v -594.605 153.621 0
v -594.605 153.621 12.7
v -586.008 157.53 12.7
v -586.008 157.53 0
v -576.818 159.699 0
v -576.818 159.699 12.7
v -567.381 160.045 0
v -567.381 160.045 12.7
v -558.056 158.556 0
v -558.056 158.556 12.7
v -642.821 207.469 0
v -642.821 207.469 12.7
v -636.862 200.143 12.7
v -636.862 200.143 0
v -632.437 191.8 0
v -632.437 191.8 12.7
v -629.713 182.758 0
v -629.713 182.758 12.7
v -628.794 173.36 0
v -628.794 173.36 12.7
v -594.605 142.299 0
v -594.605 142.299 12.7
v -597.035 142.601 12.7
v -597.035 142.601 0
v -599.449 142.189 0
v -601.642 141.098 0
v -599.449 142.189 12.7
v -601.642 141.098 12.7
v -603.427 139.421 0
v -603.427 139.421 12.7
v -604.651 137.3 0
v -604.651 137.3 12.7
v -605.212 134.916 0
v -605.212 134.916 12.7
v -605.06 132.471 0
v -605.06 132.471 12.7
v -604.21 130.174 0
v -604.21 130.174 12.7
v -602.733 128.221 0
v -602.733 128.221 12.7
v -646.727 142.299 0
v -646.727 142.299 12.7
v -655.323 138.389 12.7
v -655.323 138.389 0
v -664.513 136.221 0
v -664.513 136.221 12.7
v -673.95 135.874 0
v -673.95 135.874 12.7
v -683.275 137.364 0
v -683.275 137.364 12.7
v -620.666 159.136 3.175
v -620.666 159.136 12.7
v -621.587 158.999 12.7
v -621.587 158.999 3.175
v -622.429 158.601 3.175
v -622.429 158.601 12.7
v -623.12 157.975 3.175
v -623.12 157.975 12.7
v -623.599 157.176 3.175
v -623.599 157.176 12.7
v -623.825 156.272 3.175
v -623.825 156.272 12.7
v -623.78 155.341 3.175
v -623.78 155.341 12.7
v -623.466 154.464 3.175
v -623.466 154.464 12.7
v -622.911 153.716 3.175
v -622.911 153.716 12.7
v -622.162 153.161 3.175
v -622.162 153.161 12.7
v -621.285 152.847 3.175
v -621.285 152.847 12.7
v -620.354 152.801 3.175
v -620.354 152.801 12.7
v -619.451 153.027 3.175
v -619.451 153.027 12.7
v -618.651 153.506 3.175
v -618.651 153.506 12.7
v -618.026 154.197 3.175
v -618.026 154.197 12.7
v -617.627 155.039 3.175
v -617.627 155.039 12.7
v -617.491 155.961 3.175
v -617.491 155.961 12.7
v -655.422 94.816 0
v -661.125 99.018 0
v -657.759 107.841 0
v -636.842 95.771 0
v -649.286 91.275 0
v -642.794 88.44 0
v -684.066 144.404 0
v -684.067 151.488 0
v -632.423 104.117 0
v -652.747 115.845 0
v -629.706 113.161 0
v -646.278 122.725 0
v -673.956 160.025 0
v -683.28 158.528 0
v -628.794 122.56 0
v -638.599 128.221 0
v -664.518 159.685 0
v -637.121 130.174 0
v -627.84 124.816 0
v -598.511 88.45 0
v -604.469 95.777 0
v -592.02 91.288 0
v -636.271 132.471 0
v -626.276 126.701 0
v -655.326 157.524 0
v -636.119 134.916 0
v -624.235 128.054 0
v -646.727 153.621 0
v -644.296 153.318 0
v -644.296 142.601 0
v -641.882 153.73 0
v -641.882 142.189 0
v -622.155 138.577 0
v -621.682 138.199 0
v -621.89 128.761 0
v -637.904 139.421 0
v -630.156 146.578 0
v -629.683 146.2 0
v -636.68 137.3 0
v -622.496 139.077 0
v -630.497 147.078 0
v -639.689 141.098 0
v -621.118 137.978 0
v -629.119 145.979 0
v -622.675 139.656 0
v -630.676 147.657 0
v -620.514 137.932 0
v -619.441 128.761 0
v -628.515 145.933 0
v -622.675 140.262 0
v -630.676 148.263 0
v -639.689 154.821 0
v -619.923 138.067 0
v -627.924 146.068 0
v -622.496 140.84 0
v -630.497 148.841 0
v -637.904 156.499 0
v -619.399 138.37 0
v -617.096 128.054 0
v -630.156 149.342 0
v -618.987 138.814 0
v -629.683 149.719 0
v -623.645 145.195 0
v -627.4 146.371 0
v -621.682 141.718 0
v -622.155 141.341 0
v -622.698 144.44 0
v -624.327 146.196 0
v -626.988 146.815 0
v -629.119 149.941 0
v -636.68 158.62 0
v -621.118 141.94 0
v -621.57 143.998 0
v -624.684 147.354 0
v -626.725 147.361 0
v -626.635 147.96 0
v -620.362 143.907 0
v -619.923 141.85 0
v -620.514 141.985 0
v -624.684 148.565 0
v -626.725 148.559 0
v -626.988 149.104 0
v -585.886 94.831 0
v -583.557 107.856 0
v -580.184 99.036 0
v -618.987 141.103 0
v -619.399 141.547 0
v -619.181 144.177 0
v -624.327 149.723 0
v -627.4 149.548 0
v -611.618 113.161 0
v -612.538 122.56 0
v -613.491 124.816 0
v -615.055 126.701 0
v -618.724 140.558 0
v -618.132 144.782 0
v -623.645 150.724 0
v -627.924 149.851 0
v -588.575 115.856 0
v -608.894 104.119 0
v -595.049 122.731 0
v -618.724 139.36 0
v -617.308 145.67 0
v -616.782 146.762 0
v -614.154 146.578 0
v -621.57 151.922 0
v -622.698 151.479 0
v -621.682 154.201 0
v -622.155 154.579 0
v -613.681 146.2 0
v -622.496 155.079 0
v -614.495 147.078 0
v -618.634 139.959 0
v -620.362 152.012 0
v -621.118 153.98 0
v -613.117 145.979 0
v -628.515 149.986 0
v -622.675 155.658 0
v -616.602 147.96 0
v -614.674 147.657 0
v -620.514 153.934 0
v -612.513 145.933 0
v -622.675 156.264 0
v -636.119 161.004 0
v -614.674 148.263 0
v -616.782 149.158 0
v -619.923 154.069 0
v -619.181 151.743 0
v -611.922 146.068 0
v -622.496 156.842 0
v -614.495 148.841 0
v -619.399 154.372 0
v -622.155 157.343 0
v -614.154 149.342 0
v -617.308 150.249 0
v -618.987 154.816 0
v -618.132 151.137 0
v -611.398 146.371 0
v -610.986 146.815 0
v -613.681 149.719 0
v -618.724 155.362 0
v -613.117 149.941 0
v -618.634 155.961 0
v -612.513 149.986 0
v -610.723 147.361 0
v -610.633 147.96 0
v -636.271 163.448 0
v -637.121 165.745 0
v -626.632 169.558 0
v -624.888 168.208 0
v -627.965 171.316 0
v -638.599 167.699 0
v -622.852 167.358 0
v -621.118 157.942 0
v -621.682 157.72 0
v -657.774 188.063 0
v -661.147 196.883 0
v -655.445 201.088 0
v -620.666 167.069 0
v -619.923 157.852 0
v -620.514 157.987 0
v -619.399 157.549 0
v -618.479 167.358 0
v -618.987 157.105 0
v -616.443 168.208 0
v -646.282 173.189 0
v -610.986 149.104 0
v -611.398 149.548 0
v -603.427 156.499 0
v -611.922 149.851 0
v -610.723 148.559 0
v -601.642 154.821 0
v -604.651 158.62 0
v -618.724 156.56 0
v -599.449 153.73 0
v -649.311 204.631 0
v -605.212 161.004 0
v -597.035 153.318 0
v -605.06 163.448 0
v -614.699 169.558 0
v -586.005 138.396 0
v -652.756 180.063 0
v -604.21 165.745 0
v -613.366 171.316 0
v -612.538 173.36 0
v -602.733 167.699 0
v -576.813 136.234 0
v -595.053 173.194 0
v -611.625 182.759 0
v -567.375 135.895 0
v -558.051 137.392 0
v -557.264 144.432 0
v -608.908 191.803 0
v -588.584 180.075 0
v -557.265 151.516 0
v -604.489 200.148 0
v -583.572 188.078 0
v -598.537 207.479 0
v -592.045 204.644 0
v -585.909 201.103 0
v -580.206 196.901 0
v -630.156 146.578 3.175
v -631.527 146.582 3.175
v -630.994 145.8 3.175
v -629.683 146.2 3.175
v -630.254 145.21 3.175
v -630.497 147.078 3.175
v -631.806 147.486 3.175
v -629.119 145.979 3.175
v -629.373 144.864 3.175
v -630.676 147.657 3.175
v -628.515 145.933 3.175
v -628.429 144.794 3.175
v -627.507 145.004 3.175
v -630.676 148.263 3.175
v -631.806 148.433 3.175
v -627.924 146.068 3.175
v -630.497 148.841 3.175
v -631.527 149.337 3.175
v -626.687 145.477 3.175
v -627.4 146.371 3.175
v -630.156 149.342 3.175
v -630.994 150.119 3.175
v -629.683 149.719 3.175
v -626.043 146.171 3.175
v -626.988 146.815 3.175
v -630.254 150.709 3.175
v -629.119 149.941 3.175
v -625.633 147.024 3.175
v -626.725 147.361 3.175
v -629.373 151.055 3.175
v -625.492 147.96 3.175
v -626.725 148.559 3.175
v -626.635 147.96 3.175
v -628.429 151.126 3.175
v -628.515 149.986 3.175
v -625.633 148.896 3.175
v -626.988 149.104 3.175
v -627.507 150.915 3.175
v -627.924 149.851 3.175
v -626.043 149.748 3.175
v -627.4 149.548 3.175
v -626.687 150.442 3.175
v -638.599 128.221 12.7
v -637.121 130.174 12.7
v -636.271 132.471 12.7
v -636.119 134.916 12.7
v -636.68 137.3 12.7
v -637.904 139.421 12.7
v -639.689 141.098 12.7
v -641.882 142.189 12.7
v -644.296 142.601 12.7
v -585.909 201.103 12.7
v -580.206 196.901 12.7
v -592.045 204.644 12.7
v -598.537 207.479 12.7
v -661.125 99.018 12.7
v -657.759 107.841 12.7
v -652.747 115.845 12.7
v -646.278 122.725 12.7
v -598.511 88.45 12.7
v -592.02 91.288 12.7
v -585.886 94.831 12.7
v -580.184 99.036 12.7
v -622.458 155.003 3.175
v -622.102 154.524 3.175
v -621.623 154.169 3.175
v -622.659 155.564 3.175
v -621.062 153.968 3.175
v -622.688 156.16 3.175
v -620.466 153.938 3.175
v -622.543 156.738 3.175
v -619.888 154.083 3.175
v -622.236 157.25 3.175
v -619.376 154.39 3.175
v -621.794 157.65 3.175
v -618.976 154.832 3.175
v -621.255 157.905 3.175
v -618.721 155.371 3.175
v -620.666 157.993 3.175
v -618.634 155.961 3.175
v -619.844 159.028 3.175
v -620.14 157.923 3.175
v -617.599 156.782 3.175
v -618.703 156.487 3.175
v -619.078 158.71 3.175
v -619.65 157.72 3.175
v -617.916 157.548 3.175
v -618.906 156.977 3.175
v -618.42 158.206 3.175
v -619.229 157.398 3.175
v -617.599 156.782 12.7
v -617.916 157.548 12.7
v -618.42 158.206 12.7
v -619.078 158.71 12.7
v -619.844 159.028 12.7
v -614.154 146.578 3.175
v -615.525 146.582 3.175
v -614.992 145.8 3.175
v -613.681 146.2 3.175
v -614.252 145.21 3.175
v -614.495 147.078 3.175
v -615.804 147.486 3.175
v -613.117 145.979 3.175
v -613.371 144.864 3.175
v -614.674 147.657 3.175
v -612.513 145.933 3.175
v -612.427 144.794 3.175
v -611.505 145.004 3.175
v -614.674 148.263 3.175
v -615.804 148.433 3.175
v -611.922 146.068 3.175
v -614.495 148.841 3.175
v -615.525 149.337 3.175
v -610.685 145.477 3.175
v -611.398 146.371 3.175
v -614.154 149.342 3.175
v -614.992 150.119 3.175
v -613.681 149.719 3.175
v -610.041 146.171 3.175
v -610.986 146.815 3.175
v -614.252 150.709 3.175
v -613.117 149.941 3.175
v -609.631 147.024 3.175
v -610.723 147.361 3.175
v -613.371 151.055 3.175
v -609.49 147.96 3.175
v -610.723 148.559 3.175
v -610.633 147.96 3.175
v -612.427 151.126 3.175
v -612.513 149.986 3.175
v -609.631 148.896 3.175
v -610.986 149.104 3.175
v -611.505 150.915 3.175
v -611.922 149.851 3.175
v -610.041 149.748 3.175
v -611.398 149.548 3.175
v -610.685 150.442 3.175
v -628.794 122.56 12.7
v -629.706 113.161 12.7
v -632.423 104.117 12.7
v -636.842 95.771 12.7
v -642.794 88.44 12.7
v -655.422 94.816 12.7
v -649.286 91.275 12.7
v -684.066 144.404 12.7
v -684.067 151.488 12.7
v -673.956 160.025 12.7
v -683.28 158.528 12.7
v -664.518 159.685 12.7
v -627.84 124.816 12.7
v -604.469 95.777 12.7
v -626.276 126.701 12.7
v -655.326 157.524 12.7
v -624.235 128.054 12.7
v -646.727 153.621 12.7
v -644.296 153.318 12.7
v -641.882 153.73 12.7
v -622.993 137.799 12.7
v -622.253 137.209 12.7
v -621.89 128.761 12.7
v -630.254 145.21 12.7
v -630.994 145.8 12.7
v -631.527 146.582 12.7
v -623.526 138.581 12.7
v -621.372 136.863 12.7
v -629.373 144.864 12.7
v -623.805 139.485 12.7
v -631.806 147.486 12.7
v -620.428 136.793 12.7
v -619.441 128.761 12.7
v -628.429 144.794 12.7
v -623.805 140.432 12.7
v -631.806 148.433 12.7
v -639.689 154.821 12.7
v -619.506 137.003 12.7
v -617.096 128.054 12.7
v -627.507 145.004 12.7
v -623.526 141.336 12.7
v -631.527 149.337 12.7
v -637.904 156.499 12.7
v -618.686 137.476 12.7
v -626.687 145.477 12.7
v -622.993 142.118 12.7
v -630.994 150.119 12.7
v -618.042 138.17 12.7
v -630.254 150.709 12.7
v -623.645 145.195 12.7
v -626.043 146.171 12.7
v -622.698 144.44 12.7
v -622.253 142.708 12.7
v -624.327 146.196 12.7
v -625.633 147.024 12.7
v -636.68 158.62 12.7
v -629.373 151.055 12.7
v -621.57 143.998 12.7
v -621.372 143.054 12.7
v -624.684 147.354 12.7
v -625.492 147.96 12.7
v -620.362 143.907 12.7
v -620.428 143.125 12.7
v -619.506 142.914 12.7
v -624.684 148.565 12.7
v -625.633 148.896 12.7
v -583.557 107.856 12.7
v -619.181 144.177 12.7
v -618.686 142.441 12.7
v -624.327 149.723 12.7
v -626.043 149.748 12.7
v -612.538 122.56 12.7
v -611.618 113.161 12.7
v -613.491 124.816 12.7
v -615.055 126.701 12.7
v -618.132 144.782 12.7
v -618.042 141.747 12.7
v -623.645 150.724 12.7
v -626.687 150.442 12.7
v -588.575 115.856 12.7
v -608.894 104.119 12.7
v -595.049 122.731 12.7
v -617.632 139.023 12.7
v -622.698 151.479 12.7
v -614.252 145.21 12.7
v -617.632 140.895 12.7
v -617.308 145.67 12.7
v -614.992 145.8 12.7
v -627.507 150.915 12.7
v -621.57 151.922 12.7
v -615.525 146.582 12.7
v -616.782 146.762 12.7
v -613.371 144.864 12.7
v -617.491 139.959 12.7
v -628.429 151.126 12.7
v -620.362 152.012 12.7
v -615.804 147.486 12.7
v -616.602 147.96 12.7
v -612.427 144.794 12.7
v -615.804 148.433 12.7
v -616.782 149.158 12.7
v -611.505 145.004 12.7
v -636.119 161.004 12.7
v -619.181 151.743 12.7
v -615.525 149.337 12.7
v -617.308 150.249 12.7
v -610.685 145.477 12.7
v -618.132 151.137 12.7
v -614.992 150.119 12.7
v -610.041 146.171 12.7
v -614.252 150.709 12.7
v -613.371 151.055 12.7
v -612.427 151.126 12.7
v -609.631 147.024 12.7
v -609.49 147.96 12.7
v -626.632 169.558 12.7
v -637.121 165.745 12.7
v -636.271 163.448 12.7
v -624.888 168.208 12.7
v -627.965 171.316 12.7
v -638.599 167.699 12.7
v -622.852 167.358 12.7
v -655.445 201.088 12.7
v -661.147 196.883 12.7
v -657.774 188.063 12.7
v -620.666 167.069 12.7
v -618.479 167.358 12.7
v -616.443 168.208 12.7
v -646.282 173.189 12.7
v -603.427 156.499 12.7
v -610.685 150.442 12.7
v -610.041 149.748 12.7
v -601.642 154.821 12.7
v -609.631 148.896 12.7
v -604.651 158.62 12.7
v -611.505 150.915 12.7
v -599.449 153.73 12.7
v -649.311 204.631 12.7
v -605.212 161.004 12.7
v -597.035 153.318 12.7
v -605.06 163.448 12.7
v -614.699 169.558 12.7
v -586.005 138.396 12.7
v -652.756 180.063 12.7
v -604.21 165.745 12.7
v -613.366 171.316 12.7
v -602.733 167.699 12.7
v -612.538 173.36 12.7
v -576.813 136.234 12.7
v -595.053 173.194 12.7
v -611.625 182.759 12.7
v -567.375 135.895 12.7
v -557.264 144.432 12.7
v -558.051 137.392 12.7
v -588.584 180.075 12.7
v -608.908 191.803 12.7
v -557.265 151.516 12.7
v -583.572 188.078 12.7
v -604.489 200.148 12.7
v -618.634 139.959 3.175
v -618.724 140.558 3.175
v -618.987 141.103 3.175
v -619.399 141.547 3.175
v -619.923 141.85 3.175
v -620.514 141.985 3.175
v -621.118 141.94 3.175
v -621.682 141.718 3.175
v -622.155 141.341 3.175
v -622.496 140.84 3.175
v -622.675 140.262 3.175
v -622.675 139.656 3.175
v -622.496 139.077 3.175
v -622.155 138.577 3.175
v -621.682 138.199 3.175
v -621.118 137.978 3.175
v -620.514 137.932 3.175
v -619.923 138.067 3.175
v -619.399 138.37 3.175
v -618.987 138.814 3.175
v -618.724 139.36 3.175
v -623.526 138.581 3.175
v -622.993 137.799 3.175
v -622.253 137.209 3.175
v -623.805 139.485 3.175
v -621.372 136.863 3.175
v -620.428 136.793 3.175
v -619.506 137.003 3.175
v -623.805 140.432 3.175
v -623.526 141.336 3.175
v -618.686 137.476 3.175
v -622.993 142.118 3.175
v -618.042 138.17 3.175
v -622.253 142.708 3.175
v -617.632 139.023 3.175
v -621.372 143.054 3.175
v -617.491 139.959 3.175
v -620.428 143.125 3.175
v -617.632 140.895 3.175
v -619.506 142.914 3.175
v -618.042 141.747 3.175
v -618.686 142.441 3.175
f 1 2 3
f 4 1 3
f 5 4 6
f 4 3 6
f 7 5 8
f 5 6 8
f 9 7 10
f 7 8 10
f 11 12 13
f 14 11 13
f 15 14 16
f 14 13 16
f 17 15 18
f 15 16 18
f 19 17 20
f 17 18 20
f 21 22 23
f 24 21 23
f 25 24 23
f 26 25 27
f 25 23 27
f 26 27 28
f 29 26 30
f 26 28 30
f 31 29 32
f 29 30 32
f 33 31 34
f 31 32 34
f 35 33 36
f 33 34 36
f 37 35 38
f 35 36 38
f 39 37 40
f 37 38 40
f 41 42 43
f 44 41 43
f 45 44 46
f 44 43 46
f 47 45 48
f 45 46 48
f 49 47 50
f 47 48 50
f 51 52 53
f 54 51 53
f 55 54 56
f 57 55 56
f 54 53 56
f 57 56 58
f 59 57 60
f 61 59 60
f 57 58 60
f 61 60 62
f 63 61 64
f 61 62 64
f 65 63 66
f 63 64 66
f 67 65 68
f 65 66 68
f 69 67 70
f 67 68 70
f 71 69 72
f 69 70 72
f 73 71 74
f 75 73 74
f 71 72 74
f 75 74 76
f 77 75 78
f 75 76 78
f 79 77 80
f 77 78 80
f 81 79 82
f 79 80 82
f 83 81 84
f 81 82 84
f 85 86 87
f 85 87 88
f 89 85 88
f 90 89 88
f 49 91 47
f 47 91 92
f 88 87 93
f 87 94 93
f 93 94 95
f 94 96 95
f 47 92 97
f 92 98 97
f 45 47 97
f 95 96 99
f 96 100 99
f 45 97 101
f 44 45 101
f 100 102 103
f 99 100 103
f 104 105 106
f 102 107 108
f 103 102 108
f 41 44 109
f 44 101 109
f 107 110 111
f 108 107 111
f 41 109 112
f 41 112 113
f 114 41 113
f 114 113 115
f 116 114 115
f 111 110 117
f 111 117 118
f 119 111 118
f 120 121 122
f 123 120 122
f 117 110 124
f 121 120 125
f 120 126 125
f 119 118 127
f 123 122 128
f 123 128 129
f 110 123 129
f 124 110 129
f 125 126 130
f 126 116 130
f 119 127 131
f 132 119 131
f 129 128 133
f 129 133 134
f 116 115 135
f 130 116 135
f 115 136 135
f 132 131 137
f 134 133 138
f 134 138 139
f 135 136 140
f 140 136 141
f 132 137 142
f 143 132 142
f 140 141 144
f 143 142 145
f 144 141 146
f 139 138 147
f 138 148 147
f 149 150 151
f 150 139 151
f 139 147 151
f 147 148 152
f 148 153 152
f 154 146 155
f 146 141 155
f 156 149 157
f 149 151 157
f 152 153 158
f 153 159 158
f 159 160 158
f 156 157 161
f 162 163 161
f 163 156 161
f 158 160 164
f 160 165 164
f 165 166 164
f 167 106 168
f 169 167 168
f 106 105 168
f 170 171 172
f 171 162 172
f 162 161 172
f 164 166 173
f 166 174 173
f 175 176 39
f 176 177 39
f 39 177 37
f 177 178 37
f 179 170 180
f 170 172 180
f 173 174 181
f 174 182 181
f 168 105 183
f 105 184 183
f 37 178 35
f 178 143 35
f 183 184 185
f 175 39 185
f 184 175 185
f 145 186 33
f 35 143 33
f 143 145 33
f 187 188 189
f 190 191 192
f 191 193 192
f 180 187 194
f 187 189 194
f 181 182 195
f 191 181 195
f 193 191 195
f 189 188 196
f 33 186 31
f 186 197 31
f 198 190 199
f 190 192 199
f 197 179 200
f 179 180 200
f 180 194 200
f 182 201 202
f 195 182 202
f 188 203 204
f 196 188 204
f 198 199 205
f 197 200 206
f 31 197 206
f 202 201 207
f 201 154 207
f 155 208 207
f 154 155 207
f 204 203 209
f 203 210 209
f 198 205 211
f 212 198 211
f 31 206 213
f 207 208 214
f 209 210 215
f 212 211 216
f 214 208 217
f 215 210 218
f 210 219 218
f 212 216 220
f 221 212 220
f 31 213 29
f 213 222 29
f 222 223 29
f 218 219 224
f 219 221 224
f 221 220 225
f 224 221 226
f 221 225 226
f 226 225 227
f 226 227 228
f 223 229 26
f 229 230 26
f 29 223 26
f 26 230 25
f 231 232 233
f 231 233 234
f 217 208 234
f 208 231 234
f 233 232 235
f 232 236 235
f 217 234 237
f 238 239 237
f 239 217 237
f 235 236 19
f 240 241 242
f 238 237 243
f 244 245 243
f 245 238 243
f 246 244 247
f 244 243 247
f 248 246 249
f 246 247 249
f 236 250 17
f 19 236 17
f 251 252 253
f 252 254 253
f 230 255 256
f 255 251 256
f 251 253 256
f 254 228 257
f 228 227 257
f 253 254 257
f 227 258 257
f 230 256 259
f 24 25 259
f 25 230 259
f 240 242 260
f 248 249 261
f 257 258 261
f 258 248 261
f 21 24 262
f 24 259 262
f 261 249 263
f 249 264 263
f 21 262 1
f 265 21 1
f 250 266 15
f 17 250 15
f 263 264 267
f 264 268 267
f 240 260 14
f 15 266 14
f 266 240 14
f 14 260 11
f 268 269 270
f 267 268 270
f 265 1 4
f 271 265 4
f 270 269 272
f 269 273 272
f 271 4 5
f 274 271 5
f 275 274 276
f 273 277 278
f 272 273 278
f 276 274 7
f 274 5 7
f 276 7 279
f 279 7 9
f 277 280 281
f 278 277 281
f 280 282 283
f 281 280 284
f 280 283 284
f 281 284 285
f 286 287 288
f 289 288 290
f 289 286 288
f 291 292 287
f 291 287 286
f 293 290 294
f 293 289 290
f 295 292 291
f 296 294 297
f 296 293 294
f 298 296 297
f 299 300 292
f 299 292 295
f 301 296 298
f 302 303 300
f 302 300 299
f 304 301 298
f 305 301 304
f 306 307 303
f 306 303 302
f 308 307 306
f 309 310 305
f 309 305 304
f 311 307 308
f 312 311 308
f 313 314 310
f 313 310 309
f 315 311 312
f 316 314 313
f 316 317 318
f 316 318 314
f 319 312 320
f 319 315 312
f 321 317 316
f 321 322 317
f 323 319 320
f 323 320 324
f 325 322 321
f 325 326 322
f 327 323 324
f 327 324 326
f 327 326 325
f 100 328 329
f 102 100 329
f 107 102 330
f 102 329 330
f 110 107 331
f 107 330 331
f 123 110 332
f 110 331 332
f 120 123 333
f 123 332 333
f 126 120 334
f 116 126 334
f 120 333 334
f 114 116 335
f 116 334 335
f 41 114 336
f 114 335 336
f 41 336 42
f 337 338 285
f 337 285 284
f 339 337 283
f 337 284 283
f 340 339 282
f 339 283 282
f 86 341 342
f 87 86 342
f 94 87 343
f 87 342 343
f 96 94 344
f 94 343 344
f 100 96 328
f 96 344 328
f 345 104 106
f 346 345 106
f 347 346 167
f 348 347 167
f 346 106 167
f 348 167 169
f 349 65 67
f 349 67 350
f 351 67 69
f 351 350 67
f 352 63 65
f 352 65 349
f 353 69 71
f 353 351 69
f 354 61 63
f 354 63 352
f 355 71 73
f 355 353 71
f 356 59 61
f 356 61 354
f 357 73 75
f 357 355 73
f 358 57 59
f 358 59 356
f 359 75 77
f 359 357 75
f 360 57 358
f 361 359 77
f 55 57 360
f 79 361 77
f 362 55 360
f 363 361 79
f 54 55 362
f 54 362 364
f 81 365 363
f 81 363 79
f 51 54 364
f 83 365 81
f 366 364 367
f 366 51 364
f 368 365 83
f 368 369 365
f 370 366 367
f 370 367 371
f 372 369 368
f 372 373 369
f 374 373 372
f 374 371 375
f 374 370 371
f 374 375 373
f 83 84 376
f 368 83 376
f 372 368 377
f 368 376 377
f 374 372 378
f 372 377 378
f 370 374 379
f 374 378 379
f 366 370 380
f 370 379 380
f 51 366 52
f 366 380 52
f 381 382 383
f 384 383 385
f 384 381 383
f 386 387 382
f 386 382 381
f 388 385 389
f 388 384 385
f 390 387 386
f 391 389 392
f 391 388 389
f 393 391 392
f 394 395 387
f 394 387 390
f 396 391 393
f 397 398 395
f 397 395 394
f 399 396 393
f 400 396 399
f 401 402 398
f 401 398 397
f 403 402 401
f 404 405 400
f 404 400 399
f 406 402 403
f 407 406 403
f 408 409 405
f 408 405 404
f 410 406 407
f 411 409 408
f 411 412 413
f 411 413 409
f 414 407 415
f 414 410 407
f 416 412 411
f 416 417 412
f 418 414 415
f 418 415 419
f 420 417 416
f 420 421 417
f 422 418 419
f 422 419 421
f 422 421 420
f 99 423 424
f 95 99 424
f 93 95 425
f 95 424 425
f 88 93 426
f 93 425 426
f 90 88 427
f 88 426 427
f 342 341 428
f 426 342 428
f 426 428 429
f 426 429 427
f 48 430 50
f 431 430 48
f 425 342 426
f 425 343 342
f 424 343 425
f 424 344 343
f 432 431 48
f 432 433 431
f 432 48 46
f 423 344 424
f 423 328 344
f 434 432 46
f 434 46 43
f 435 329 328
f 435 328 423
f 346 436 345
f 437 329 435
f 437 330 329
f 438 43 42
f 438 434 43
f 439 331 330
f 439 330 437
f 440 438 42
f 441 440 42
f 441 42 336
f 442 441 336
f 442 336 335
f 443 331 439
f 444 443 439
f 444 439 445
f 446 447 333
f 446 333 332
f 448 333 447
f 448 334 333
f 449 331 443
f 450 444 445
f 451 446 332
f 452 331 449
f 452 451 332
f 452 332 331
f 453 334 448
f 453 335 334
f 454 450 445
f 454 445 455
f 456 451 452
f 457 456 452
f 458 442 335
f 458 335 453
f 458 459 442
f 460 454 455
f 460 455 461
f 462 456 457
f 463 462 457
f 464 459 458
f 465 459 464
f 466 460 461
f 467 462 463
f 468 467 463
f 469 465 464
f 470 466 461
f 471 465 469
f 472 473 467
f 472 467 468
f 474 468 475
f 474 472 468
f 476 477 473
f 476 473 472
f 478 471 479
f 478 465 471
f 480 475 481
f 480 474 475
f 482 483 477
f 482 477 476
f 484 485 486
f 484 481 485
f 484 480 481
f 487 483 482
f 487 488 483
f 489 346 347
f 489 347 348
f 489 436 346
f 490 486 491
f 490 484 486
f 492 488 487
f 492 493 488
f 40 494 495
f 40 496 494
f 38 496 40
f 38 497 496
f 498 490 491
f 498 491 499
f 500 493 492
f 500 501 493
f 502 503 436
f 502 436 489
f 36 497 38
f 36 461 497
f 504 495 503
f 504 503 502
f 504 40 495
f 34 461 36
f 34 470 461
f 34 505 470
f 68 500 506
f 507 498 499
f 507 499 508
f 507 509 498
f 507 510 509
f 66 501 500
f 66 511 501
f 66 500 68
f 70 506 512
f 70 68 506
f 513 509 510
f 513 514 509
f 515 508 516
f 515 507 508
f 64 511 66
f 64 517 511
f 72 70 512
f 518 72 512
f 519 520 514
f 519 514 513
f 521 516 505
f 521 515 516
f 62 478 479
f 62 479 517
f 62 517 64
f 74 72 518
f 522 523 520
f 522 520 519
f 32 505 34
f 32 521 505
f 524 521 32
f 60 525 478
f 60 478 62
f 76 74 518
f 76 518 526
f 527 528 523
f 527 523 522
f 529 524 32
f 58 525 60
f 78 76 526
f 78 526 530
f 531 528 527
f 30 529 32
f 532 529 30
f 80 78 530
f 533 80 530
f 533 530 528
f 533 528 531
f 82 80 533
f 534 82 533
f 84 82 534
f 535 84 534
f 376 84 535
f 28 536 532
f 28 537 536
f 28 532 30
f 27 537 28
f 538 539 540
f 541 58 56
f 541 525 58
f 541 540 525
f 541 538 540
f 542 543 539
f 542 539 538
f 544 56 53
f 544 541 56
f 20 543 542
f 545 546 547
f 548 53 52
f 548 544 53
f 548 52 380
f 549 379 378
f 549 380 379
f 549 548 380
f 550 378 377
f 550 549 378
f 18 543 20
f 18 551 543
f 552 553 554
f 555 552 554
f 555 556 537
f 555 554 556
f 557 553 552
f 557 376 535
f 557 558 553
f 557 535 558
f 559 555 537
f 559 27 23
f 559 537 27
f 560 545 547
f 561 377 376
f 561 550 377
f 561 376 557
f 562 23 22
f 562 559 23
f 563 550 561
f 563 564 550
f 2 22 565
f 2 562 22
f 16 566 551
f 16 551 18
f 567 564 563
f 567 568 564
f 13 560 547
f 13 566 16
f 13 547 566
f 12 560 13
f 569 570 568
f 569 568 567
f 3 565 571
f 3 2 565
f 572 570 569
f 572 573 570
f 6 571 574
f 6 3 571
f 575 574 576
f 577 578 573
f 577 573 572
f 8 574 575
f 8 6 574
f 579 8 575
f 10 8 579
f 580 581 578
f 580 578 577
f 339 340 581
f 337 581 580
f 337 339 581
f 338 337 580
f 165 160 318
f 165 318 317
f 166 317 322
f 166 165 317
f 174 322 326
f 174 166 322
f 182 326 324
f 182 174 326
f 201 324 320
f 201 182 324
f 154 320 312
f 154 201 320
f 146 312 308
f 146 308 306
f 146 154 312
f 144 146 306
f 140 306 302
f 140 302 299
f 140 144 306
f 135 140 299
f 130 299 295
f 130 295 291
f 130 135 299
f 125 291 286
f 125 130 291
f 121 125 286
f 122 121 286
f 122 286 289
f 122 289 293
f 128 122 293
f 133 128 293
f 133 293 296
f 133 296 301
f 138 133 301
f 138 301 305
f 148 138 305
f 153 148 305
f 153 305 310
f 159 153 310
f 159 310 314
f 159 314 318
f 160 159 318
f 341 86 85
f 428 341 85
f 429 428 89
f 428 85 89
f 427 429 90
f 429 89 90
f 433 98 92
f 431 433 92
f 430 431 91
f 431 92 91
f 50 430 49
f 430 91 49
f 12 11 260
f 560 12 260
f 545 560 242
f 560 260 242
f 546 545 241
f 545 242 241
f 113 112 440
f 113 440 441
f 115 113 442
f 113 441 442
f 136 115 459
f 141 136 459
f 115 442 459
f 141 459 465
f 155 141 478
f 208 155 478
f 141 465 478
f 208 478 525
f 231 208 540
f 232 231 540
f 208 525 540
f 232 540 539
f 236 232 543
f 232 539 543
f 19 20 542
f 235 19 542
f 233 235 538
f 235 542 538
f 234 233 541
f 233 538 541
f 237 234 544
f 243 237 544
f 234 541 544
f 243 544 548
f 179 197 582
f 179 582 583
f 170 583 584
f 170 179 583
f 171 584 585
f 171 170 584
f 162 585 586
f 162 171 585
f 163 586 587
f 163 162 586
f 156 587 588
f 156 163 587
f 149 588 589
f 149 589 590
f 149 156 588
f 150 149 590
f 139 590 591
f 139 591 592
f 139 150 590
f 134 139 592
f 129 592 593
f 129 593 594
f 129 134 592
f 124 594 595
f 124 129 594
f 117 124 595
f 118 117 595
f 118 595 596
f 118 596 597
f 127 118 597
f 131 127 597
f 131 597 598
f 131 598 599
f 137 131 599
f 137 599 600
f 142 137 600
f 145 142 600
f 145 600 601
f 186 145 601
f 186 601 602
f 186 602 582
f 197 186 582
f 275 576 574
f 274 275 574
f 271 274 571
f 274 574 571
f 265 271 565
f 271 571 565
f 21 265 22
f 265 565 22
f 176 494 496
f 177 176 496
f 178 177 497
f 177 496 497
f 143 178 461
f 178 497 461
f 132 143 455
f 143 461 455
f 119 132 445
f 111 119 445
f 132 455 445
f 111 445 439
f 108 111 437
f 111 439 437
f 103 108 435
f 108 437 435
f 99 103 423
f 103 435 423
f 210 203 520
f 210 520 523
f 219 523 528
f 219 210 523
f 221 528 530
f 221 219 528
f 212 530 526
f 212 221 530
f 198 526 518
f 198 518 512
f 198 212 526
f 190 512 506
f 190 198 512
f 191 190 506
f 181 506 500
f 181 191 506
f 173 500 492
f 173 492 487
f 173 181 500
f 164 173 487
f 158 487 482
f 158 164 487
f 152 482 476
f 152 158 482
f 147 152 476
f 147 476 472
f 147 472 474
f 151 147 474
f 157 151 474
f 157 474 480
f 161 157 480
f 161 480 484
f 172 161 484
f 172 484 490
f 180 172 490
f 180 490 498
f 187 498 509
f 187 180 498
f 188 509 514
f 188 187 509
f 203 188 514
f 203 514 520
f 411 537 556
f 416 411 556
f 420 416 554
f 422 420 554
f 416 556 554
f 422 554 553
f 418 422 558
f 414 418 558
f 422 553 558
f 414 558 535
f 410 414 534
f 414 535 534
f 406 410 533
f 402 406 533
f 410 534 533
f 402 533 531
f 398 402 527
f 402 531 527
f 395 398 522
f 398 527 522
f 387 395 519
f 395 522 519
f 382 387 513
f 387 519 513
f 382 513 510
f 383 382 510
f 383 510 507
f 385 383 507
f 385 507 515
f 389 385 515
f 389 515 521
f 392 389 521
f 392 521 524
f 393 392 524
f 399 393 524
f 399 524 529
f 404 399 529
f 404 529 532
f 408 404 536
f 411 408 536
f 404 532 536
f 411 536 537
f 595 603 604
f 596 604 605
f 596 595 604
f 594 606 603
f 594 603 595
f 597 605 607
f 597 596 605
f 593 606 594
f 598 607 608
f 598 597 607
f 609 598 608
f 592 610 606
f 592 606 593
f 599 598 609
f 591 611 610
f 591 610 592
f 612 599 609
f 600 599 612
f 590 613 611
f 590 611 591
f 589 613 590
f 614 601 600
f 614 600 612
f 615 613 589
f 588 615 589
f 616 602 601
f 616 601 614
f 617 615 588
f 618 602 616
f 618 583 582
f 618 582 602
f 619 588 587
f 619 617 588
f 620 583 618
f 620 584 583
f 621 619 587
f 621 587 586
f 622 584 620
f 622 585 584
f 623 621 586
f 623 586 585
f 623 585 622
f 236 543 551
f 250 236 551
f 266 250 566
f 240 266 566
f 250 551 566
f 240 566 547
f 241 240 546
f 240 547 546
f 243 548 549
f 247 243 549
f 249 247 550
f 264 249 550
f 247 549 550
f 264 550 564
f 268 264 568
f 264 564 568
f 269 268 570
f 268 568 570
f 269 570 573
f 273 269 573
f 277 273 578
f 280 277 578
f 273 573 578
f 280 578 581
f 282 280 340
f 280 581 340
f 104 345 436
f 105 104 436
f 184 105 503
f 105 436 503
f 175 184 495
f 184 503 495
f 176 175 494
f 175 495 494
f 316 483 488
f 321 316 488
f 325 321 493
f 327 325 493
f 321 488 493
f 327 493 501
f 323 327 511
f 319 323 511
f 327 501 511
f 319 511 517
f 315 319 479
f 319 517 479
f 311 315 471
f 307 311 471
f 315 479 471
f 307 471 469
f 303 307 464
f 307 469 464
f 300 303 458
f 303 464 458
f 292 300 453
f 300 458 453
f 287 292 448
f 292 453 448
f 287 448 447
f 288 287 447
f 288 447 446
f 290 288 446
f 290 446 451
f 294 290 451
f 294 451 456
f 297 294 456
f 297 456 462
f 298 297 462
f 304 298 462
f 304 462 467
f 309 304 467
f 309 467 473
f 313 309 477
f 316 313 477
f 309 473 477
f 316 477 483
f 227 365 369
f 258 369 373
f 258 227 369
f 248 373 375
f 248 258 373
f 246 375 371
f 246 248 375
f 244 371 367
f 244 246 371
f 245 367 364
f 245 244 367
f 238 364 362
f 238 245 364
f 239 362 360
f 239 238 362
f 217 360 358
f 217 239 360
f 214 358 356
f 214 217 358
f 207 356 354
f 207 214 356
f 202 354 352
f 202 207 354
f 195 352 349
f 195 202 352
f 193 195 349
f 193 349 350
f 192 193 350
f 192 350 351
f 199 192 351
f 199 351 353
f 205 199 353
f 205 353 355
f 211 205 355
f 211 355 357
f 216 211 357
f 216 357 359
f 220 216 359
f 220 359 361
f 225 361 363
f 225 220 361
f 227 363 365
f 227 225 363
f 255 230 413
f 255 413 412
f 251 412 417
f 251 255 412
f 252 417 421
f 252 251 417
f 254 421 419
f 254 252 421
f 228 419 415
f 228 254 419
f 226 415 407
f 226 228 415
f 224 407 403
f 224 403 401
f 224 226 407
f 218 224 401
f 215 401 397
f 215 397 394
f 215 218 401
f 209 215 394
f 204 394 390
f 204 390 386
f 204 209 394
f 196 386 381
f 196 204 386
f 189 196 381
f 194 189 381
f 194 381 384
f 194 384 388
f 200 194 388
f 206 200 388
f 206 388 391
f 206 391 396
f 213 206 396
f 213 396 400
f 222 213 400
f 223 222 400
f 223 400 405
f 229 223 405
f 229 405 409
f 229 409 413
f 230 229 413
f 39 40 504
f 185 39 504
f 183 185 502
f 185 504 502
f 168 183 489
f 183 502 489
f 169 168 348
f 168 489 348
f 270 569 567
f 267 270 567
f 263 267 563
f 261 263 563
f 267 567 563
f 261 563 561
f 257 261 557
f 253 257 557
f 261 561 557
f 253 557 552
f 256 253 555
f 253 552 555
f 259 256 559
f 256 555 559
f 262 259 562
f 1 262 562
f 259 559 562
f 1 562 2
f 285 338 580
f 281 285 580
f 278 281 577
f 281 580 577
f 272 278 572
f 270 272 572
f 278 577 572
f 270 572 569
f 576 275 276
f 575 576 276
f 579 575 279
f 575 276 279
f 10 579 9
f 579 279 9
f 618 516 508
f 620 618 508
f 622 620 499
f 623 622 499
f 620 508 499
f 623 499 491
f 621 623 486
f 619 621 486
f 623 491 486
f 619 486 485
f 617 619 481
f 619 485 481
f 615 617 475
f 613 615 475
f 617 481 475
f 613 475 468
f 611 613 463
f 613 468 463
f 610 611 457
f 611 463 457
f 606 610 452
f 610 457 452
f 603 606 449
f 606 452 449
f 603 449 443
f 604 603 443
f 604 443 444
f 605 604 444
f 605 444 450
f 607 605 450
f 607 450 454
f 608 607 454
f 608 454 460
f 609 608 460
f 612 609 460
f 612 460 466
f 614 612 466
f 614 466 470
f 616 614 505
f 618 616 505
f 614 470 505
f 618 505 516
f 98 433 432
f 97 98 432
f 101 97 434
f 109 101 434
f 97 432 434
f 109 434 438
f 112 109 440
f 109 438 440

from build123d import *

# Parameters (mm, degrees)
F0_R     = 63.5
F0_R_2   = 25.4
F0_R_3   = 2.032
F0_R_4   = 4.064
F1_DEPTH = 12.7
F2_R     = 3.175
F2_R_2   = 2.032
F3_DEPTH = 9.525
F4_DEPTH = 12.7


with BuildPart() as f1:
    # F0 (on Top) → F1 (new body)
    with BuildSketch(Plane.XY):
        with Locations((-620.6655502319, 147.9596942663)):
            Circle(F0_R)
        with Locations((-620.6655502319, 147.9596942663)):
            Circle(F0_R_2, mode=Mode.SUBTRACT)
        with Locations((-620.6655502319, 147.9596942663)):
            Circle(F0_R_2)
        with Locations((-620.6655502319, 139.9586942663)):
            Circle(F0_R_3, mode=Mode.SUBTRACT)
        with Locations((-628.6665502319, 147.9596942663)):
            Circle(F0_R_3, mode=Mode.SUBTRACT)
        with Locations((-620.6655502319, 147.9596942663)):
            Circle(F0_R_4, mode=Mode.SUBTRACT)
        with Locations((-612.6645502319, 147.9596942663)):
            Circle(F0_R_3, mode=Mode.SUBTRACT)
        with Locations((-620.6655502319, 155.9606942663)):
            Circle(F0_R_3, mode=Mode.SUBTRACT)
    extrude(amount=F1_DEPTH)

    # F2 (on face) → F3 (cut)
    with BuildSketch(Plane.XY.offset(12.7)):
        with Locations((-628.6665502319, 147.9596942663)):
            Circle(F2_R)
        with Locations((-628.6665502319, 147.9596942663)):
            Circle(F2_R_2, mode=Mode.SUBTRACT)
        with BuildLine():
            ThreePointArc((-620.6655502319, 159.1356942663), (-622.9106142622, 153.7156302361), (-617.4905502319, 155.9606942663))
            ThreePointArc((-617.4905502319, 155.9606942663), (-618.4204862017, 158.2057582966), (-620.6655502319, 159.1356942663))
        make_face()
        with BuildLine():
            ThreePointArc((-618.6335502319, 155.9606942663), (-622.1023912113, 154.5238532869), (-620.6655502319, 157.9926942663))
            ThreePointArc((-620.6655502319, 157.9926942663), (-619.2287092526, 157.3975352457), (-618.6335502319, 155.9606942663))
        make_face(mode=Mode.SUBTRACT)
        with Locations((-612.6645502319, 147.9596942663)):
            Circle(F2_R)
        with Locations((-612.6645502319, 147.9596942663)):
            Circle(F2_R_2, mode=Mode.SUBTRACT)
        with Locations((-620.6655502319, 139.9586942663)):
            Circle(F2_R)
        with Locations((-620.6655502319, 139.9586942663)):
            Circle(F2_R_2, mode=Mode.SUBTRACT)
    extrude(amount=-F3_DEPTH, mode=Mode.SUBTRACT)

    # F2 (on face) → F4 (cut)
    with BuildSketch(Plane.XY.offset(12.7)):
        with BuildLine():
            ThreePointArc((-628.7935502319, 173.3596942663), (-625.8046499913, 168.8251534834), (-620.6655502319, 167.0686688056))
            ThreePointArc((-620.6655502319, 167.0686688056), (-615.5264504725, 168.8251534834), (-612.5375502319, 173.3596942663))
            ThreePointArc((-612.5375502319, 173.3596942663), (-608.9080068362, 191.8026056382), (-598.5370363488, 207.4792614129))
            ThreePointArc((-598.5370363488, 207.4792614129), (-620.6796633161, 211.459692698), (-642.8205187681, 207.4694192628))
            ThreePointArc((-642.8205187681, 207.4694192628), (-632.4371990863, 191.8003367826), (-628.7935502319, 173.3596942663))
        make_face()
        with BuildLine():
            ThreePointArc((-638.5985954881, 167.6987487483), (-652.755853558, 180.063481219), (-661.1467504616, 196.8833330105))
            ThreePointArc((-661.1467504616, 196.8833330105), (-675.6652185561, 179.6974711927), (-683.2799681192, 158.5277911922))
            ThreePointArc((-683.2799681192, 158.5277911922), (-664.5184847964, 159.6854685722), (-646.7265954881, 153.6206397844))
            ThreePointArc((-646.7265954881, 153.6206397844), (-637.2144076232, 157.5141815359), (-638.5985954881, 167.6987487483))
        make_face()
        with BuildLine():
            ThreePointArc((-646.7265954881, 142.2987487483), (-664.5133969537, 136.2205698472), (-683.2752643448, 137.3637658638))
            ThreePointArc((-683.2752643448, 137.3637658638), (-675.6511054719, 116.197472761), (-661.1249995831, 99.0180661957))
            ThreePointArc((-661.1249995831, 99.0180661957), (-652.7468359421, 115.8448260559), (-638.5985954881, 128.2206397844))
            ThreePointArc((-638.5985954881, 128.2206397844), (-637.2144076232, 138.4052069967), (-646.7265954881, 142.2987487483))
        make_face()
        with BuildLine():
            ThreePointArc((-628.7935502319, 122.5596942663), (-632.4230936276, 104.1167828944), (-642.7940641151, 88.4401271197))
            ThreePointArc((-642.7940641151, 88.4401271197), (-620.6514371477, 84.4596958347), (-598.5105816958, 88.4499692698))
            ThreePointArc((-598.5105816958, 88.4499692698), (-608.8939013776, 104.11905175), (-612.5375502319, 122.5596942663))
            ThreePointArc((-612.5375502319, 122.5596942663), (-620.6655502319, 128.8507197271), (-628.7935502319, 122.5596942663))
        make_face()
        with BuildLine():
            ThreePointArc((-580.1843500023, 99.0360555222), (-565.6658819077, 116.2219173399), (-558.0511323446, 137.3915973404))
            ThreePointArc((-558.0511323446, 137.3915973404), (-576.8126156674, 136.2339199605), (-594.6045049758, 142.2987487483))
            ThreePointArc((-594.6045049758, 142.2987487483), (-604.1166928407, 138.4052069967), (-602.7325049758, 128.2206397844))
            ThreePointArc((-602.7325049758, 128.2206397844), (-588.5752469059, 115.8559073136), (-580.1843500023, 99.0360555222))
        make_face()
        with BuildLine():
            ThreePointArc((-558.0558361191, 158.5556226688), (-565.6799949919, 179.7219157716), (-580.2061008808, 196.9013223369))
            ThreePointArc((-580.2061008808, 196.9013223369), (-588.5842645218, 180.0745624768), (-602.7325049758, 167.6987487483))
            ThreePointArc((-602.7325049758, 167.6987487483), (-604.1166928407, 157.5141815359), (-594.6045049758, 153.6206397844))
            ThreePointArc((-594.6045049758, 153.6206397844), (-576.8177035102, 159.6988186855), (-558.0558361191, 158.5556226688))
        make_face()
    extrude(amount=-F4_DEPTH, mode=Mode.SUBTRACT)


solid = f1.part
